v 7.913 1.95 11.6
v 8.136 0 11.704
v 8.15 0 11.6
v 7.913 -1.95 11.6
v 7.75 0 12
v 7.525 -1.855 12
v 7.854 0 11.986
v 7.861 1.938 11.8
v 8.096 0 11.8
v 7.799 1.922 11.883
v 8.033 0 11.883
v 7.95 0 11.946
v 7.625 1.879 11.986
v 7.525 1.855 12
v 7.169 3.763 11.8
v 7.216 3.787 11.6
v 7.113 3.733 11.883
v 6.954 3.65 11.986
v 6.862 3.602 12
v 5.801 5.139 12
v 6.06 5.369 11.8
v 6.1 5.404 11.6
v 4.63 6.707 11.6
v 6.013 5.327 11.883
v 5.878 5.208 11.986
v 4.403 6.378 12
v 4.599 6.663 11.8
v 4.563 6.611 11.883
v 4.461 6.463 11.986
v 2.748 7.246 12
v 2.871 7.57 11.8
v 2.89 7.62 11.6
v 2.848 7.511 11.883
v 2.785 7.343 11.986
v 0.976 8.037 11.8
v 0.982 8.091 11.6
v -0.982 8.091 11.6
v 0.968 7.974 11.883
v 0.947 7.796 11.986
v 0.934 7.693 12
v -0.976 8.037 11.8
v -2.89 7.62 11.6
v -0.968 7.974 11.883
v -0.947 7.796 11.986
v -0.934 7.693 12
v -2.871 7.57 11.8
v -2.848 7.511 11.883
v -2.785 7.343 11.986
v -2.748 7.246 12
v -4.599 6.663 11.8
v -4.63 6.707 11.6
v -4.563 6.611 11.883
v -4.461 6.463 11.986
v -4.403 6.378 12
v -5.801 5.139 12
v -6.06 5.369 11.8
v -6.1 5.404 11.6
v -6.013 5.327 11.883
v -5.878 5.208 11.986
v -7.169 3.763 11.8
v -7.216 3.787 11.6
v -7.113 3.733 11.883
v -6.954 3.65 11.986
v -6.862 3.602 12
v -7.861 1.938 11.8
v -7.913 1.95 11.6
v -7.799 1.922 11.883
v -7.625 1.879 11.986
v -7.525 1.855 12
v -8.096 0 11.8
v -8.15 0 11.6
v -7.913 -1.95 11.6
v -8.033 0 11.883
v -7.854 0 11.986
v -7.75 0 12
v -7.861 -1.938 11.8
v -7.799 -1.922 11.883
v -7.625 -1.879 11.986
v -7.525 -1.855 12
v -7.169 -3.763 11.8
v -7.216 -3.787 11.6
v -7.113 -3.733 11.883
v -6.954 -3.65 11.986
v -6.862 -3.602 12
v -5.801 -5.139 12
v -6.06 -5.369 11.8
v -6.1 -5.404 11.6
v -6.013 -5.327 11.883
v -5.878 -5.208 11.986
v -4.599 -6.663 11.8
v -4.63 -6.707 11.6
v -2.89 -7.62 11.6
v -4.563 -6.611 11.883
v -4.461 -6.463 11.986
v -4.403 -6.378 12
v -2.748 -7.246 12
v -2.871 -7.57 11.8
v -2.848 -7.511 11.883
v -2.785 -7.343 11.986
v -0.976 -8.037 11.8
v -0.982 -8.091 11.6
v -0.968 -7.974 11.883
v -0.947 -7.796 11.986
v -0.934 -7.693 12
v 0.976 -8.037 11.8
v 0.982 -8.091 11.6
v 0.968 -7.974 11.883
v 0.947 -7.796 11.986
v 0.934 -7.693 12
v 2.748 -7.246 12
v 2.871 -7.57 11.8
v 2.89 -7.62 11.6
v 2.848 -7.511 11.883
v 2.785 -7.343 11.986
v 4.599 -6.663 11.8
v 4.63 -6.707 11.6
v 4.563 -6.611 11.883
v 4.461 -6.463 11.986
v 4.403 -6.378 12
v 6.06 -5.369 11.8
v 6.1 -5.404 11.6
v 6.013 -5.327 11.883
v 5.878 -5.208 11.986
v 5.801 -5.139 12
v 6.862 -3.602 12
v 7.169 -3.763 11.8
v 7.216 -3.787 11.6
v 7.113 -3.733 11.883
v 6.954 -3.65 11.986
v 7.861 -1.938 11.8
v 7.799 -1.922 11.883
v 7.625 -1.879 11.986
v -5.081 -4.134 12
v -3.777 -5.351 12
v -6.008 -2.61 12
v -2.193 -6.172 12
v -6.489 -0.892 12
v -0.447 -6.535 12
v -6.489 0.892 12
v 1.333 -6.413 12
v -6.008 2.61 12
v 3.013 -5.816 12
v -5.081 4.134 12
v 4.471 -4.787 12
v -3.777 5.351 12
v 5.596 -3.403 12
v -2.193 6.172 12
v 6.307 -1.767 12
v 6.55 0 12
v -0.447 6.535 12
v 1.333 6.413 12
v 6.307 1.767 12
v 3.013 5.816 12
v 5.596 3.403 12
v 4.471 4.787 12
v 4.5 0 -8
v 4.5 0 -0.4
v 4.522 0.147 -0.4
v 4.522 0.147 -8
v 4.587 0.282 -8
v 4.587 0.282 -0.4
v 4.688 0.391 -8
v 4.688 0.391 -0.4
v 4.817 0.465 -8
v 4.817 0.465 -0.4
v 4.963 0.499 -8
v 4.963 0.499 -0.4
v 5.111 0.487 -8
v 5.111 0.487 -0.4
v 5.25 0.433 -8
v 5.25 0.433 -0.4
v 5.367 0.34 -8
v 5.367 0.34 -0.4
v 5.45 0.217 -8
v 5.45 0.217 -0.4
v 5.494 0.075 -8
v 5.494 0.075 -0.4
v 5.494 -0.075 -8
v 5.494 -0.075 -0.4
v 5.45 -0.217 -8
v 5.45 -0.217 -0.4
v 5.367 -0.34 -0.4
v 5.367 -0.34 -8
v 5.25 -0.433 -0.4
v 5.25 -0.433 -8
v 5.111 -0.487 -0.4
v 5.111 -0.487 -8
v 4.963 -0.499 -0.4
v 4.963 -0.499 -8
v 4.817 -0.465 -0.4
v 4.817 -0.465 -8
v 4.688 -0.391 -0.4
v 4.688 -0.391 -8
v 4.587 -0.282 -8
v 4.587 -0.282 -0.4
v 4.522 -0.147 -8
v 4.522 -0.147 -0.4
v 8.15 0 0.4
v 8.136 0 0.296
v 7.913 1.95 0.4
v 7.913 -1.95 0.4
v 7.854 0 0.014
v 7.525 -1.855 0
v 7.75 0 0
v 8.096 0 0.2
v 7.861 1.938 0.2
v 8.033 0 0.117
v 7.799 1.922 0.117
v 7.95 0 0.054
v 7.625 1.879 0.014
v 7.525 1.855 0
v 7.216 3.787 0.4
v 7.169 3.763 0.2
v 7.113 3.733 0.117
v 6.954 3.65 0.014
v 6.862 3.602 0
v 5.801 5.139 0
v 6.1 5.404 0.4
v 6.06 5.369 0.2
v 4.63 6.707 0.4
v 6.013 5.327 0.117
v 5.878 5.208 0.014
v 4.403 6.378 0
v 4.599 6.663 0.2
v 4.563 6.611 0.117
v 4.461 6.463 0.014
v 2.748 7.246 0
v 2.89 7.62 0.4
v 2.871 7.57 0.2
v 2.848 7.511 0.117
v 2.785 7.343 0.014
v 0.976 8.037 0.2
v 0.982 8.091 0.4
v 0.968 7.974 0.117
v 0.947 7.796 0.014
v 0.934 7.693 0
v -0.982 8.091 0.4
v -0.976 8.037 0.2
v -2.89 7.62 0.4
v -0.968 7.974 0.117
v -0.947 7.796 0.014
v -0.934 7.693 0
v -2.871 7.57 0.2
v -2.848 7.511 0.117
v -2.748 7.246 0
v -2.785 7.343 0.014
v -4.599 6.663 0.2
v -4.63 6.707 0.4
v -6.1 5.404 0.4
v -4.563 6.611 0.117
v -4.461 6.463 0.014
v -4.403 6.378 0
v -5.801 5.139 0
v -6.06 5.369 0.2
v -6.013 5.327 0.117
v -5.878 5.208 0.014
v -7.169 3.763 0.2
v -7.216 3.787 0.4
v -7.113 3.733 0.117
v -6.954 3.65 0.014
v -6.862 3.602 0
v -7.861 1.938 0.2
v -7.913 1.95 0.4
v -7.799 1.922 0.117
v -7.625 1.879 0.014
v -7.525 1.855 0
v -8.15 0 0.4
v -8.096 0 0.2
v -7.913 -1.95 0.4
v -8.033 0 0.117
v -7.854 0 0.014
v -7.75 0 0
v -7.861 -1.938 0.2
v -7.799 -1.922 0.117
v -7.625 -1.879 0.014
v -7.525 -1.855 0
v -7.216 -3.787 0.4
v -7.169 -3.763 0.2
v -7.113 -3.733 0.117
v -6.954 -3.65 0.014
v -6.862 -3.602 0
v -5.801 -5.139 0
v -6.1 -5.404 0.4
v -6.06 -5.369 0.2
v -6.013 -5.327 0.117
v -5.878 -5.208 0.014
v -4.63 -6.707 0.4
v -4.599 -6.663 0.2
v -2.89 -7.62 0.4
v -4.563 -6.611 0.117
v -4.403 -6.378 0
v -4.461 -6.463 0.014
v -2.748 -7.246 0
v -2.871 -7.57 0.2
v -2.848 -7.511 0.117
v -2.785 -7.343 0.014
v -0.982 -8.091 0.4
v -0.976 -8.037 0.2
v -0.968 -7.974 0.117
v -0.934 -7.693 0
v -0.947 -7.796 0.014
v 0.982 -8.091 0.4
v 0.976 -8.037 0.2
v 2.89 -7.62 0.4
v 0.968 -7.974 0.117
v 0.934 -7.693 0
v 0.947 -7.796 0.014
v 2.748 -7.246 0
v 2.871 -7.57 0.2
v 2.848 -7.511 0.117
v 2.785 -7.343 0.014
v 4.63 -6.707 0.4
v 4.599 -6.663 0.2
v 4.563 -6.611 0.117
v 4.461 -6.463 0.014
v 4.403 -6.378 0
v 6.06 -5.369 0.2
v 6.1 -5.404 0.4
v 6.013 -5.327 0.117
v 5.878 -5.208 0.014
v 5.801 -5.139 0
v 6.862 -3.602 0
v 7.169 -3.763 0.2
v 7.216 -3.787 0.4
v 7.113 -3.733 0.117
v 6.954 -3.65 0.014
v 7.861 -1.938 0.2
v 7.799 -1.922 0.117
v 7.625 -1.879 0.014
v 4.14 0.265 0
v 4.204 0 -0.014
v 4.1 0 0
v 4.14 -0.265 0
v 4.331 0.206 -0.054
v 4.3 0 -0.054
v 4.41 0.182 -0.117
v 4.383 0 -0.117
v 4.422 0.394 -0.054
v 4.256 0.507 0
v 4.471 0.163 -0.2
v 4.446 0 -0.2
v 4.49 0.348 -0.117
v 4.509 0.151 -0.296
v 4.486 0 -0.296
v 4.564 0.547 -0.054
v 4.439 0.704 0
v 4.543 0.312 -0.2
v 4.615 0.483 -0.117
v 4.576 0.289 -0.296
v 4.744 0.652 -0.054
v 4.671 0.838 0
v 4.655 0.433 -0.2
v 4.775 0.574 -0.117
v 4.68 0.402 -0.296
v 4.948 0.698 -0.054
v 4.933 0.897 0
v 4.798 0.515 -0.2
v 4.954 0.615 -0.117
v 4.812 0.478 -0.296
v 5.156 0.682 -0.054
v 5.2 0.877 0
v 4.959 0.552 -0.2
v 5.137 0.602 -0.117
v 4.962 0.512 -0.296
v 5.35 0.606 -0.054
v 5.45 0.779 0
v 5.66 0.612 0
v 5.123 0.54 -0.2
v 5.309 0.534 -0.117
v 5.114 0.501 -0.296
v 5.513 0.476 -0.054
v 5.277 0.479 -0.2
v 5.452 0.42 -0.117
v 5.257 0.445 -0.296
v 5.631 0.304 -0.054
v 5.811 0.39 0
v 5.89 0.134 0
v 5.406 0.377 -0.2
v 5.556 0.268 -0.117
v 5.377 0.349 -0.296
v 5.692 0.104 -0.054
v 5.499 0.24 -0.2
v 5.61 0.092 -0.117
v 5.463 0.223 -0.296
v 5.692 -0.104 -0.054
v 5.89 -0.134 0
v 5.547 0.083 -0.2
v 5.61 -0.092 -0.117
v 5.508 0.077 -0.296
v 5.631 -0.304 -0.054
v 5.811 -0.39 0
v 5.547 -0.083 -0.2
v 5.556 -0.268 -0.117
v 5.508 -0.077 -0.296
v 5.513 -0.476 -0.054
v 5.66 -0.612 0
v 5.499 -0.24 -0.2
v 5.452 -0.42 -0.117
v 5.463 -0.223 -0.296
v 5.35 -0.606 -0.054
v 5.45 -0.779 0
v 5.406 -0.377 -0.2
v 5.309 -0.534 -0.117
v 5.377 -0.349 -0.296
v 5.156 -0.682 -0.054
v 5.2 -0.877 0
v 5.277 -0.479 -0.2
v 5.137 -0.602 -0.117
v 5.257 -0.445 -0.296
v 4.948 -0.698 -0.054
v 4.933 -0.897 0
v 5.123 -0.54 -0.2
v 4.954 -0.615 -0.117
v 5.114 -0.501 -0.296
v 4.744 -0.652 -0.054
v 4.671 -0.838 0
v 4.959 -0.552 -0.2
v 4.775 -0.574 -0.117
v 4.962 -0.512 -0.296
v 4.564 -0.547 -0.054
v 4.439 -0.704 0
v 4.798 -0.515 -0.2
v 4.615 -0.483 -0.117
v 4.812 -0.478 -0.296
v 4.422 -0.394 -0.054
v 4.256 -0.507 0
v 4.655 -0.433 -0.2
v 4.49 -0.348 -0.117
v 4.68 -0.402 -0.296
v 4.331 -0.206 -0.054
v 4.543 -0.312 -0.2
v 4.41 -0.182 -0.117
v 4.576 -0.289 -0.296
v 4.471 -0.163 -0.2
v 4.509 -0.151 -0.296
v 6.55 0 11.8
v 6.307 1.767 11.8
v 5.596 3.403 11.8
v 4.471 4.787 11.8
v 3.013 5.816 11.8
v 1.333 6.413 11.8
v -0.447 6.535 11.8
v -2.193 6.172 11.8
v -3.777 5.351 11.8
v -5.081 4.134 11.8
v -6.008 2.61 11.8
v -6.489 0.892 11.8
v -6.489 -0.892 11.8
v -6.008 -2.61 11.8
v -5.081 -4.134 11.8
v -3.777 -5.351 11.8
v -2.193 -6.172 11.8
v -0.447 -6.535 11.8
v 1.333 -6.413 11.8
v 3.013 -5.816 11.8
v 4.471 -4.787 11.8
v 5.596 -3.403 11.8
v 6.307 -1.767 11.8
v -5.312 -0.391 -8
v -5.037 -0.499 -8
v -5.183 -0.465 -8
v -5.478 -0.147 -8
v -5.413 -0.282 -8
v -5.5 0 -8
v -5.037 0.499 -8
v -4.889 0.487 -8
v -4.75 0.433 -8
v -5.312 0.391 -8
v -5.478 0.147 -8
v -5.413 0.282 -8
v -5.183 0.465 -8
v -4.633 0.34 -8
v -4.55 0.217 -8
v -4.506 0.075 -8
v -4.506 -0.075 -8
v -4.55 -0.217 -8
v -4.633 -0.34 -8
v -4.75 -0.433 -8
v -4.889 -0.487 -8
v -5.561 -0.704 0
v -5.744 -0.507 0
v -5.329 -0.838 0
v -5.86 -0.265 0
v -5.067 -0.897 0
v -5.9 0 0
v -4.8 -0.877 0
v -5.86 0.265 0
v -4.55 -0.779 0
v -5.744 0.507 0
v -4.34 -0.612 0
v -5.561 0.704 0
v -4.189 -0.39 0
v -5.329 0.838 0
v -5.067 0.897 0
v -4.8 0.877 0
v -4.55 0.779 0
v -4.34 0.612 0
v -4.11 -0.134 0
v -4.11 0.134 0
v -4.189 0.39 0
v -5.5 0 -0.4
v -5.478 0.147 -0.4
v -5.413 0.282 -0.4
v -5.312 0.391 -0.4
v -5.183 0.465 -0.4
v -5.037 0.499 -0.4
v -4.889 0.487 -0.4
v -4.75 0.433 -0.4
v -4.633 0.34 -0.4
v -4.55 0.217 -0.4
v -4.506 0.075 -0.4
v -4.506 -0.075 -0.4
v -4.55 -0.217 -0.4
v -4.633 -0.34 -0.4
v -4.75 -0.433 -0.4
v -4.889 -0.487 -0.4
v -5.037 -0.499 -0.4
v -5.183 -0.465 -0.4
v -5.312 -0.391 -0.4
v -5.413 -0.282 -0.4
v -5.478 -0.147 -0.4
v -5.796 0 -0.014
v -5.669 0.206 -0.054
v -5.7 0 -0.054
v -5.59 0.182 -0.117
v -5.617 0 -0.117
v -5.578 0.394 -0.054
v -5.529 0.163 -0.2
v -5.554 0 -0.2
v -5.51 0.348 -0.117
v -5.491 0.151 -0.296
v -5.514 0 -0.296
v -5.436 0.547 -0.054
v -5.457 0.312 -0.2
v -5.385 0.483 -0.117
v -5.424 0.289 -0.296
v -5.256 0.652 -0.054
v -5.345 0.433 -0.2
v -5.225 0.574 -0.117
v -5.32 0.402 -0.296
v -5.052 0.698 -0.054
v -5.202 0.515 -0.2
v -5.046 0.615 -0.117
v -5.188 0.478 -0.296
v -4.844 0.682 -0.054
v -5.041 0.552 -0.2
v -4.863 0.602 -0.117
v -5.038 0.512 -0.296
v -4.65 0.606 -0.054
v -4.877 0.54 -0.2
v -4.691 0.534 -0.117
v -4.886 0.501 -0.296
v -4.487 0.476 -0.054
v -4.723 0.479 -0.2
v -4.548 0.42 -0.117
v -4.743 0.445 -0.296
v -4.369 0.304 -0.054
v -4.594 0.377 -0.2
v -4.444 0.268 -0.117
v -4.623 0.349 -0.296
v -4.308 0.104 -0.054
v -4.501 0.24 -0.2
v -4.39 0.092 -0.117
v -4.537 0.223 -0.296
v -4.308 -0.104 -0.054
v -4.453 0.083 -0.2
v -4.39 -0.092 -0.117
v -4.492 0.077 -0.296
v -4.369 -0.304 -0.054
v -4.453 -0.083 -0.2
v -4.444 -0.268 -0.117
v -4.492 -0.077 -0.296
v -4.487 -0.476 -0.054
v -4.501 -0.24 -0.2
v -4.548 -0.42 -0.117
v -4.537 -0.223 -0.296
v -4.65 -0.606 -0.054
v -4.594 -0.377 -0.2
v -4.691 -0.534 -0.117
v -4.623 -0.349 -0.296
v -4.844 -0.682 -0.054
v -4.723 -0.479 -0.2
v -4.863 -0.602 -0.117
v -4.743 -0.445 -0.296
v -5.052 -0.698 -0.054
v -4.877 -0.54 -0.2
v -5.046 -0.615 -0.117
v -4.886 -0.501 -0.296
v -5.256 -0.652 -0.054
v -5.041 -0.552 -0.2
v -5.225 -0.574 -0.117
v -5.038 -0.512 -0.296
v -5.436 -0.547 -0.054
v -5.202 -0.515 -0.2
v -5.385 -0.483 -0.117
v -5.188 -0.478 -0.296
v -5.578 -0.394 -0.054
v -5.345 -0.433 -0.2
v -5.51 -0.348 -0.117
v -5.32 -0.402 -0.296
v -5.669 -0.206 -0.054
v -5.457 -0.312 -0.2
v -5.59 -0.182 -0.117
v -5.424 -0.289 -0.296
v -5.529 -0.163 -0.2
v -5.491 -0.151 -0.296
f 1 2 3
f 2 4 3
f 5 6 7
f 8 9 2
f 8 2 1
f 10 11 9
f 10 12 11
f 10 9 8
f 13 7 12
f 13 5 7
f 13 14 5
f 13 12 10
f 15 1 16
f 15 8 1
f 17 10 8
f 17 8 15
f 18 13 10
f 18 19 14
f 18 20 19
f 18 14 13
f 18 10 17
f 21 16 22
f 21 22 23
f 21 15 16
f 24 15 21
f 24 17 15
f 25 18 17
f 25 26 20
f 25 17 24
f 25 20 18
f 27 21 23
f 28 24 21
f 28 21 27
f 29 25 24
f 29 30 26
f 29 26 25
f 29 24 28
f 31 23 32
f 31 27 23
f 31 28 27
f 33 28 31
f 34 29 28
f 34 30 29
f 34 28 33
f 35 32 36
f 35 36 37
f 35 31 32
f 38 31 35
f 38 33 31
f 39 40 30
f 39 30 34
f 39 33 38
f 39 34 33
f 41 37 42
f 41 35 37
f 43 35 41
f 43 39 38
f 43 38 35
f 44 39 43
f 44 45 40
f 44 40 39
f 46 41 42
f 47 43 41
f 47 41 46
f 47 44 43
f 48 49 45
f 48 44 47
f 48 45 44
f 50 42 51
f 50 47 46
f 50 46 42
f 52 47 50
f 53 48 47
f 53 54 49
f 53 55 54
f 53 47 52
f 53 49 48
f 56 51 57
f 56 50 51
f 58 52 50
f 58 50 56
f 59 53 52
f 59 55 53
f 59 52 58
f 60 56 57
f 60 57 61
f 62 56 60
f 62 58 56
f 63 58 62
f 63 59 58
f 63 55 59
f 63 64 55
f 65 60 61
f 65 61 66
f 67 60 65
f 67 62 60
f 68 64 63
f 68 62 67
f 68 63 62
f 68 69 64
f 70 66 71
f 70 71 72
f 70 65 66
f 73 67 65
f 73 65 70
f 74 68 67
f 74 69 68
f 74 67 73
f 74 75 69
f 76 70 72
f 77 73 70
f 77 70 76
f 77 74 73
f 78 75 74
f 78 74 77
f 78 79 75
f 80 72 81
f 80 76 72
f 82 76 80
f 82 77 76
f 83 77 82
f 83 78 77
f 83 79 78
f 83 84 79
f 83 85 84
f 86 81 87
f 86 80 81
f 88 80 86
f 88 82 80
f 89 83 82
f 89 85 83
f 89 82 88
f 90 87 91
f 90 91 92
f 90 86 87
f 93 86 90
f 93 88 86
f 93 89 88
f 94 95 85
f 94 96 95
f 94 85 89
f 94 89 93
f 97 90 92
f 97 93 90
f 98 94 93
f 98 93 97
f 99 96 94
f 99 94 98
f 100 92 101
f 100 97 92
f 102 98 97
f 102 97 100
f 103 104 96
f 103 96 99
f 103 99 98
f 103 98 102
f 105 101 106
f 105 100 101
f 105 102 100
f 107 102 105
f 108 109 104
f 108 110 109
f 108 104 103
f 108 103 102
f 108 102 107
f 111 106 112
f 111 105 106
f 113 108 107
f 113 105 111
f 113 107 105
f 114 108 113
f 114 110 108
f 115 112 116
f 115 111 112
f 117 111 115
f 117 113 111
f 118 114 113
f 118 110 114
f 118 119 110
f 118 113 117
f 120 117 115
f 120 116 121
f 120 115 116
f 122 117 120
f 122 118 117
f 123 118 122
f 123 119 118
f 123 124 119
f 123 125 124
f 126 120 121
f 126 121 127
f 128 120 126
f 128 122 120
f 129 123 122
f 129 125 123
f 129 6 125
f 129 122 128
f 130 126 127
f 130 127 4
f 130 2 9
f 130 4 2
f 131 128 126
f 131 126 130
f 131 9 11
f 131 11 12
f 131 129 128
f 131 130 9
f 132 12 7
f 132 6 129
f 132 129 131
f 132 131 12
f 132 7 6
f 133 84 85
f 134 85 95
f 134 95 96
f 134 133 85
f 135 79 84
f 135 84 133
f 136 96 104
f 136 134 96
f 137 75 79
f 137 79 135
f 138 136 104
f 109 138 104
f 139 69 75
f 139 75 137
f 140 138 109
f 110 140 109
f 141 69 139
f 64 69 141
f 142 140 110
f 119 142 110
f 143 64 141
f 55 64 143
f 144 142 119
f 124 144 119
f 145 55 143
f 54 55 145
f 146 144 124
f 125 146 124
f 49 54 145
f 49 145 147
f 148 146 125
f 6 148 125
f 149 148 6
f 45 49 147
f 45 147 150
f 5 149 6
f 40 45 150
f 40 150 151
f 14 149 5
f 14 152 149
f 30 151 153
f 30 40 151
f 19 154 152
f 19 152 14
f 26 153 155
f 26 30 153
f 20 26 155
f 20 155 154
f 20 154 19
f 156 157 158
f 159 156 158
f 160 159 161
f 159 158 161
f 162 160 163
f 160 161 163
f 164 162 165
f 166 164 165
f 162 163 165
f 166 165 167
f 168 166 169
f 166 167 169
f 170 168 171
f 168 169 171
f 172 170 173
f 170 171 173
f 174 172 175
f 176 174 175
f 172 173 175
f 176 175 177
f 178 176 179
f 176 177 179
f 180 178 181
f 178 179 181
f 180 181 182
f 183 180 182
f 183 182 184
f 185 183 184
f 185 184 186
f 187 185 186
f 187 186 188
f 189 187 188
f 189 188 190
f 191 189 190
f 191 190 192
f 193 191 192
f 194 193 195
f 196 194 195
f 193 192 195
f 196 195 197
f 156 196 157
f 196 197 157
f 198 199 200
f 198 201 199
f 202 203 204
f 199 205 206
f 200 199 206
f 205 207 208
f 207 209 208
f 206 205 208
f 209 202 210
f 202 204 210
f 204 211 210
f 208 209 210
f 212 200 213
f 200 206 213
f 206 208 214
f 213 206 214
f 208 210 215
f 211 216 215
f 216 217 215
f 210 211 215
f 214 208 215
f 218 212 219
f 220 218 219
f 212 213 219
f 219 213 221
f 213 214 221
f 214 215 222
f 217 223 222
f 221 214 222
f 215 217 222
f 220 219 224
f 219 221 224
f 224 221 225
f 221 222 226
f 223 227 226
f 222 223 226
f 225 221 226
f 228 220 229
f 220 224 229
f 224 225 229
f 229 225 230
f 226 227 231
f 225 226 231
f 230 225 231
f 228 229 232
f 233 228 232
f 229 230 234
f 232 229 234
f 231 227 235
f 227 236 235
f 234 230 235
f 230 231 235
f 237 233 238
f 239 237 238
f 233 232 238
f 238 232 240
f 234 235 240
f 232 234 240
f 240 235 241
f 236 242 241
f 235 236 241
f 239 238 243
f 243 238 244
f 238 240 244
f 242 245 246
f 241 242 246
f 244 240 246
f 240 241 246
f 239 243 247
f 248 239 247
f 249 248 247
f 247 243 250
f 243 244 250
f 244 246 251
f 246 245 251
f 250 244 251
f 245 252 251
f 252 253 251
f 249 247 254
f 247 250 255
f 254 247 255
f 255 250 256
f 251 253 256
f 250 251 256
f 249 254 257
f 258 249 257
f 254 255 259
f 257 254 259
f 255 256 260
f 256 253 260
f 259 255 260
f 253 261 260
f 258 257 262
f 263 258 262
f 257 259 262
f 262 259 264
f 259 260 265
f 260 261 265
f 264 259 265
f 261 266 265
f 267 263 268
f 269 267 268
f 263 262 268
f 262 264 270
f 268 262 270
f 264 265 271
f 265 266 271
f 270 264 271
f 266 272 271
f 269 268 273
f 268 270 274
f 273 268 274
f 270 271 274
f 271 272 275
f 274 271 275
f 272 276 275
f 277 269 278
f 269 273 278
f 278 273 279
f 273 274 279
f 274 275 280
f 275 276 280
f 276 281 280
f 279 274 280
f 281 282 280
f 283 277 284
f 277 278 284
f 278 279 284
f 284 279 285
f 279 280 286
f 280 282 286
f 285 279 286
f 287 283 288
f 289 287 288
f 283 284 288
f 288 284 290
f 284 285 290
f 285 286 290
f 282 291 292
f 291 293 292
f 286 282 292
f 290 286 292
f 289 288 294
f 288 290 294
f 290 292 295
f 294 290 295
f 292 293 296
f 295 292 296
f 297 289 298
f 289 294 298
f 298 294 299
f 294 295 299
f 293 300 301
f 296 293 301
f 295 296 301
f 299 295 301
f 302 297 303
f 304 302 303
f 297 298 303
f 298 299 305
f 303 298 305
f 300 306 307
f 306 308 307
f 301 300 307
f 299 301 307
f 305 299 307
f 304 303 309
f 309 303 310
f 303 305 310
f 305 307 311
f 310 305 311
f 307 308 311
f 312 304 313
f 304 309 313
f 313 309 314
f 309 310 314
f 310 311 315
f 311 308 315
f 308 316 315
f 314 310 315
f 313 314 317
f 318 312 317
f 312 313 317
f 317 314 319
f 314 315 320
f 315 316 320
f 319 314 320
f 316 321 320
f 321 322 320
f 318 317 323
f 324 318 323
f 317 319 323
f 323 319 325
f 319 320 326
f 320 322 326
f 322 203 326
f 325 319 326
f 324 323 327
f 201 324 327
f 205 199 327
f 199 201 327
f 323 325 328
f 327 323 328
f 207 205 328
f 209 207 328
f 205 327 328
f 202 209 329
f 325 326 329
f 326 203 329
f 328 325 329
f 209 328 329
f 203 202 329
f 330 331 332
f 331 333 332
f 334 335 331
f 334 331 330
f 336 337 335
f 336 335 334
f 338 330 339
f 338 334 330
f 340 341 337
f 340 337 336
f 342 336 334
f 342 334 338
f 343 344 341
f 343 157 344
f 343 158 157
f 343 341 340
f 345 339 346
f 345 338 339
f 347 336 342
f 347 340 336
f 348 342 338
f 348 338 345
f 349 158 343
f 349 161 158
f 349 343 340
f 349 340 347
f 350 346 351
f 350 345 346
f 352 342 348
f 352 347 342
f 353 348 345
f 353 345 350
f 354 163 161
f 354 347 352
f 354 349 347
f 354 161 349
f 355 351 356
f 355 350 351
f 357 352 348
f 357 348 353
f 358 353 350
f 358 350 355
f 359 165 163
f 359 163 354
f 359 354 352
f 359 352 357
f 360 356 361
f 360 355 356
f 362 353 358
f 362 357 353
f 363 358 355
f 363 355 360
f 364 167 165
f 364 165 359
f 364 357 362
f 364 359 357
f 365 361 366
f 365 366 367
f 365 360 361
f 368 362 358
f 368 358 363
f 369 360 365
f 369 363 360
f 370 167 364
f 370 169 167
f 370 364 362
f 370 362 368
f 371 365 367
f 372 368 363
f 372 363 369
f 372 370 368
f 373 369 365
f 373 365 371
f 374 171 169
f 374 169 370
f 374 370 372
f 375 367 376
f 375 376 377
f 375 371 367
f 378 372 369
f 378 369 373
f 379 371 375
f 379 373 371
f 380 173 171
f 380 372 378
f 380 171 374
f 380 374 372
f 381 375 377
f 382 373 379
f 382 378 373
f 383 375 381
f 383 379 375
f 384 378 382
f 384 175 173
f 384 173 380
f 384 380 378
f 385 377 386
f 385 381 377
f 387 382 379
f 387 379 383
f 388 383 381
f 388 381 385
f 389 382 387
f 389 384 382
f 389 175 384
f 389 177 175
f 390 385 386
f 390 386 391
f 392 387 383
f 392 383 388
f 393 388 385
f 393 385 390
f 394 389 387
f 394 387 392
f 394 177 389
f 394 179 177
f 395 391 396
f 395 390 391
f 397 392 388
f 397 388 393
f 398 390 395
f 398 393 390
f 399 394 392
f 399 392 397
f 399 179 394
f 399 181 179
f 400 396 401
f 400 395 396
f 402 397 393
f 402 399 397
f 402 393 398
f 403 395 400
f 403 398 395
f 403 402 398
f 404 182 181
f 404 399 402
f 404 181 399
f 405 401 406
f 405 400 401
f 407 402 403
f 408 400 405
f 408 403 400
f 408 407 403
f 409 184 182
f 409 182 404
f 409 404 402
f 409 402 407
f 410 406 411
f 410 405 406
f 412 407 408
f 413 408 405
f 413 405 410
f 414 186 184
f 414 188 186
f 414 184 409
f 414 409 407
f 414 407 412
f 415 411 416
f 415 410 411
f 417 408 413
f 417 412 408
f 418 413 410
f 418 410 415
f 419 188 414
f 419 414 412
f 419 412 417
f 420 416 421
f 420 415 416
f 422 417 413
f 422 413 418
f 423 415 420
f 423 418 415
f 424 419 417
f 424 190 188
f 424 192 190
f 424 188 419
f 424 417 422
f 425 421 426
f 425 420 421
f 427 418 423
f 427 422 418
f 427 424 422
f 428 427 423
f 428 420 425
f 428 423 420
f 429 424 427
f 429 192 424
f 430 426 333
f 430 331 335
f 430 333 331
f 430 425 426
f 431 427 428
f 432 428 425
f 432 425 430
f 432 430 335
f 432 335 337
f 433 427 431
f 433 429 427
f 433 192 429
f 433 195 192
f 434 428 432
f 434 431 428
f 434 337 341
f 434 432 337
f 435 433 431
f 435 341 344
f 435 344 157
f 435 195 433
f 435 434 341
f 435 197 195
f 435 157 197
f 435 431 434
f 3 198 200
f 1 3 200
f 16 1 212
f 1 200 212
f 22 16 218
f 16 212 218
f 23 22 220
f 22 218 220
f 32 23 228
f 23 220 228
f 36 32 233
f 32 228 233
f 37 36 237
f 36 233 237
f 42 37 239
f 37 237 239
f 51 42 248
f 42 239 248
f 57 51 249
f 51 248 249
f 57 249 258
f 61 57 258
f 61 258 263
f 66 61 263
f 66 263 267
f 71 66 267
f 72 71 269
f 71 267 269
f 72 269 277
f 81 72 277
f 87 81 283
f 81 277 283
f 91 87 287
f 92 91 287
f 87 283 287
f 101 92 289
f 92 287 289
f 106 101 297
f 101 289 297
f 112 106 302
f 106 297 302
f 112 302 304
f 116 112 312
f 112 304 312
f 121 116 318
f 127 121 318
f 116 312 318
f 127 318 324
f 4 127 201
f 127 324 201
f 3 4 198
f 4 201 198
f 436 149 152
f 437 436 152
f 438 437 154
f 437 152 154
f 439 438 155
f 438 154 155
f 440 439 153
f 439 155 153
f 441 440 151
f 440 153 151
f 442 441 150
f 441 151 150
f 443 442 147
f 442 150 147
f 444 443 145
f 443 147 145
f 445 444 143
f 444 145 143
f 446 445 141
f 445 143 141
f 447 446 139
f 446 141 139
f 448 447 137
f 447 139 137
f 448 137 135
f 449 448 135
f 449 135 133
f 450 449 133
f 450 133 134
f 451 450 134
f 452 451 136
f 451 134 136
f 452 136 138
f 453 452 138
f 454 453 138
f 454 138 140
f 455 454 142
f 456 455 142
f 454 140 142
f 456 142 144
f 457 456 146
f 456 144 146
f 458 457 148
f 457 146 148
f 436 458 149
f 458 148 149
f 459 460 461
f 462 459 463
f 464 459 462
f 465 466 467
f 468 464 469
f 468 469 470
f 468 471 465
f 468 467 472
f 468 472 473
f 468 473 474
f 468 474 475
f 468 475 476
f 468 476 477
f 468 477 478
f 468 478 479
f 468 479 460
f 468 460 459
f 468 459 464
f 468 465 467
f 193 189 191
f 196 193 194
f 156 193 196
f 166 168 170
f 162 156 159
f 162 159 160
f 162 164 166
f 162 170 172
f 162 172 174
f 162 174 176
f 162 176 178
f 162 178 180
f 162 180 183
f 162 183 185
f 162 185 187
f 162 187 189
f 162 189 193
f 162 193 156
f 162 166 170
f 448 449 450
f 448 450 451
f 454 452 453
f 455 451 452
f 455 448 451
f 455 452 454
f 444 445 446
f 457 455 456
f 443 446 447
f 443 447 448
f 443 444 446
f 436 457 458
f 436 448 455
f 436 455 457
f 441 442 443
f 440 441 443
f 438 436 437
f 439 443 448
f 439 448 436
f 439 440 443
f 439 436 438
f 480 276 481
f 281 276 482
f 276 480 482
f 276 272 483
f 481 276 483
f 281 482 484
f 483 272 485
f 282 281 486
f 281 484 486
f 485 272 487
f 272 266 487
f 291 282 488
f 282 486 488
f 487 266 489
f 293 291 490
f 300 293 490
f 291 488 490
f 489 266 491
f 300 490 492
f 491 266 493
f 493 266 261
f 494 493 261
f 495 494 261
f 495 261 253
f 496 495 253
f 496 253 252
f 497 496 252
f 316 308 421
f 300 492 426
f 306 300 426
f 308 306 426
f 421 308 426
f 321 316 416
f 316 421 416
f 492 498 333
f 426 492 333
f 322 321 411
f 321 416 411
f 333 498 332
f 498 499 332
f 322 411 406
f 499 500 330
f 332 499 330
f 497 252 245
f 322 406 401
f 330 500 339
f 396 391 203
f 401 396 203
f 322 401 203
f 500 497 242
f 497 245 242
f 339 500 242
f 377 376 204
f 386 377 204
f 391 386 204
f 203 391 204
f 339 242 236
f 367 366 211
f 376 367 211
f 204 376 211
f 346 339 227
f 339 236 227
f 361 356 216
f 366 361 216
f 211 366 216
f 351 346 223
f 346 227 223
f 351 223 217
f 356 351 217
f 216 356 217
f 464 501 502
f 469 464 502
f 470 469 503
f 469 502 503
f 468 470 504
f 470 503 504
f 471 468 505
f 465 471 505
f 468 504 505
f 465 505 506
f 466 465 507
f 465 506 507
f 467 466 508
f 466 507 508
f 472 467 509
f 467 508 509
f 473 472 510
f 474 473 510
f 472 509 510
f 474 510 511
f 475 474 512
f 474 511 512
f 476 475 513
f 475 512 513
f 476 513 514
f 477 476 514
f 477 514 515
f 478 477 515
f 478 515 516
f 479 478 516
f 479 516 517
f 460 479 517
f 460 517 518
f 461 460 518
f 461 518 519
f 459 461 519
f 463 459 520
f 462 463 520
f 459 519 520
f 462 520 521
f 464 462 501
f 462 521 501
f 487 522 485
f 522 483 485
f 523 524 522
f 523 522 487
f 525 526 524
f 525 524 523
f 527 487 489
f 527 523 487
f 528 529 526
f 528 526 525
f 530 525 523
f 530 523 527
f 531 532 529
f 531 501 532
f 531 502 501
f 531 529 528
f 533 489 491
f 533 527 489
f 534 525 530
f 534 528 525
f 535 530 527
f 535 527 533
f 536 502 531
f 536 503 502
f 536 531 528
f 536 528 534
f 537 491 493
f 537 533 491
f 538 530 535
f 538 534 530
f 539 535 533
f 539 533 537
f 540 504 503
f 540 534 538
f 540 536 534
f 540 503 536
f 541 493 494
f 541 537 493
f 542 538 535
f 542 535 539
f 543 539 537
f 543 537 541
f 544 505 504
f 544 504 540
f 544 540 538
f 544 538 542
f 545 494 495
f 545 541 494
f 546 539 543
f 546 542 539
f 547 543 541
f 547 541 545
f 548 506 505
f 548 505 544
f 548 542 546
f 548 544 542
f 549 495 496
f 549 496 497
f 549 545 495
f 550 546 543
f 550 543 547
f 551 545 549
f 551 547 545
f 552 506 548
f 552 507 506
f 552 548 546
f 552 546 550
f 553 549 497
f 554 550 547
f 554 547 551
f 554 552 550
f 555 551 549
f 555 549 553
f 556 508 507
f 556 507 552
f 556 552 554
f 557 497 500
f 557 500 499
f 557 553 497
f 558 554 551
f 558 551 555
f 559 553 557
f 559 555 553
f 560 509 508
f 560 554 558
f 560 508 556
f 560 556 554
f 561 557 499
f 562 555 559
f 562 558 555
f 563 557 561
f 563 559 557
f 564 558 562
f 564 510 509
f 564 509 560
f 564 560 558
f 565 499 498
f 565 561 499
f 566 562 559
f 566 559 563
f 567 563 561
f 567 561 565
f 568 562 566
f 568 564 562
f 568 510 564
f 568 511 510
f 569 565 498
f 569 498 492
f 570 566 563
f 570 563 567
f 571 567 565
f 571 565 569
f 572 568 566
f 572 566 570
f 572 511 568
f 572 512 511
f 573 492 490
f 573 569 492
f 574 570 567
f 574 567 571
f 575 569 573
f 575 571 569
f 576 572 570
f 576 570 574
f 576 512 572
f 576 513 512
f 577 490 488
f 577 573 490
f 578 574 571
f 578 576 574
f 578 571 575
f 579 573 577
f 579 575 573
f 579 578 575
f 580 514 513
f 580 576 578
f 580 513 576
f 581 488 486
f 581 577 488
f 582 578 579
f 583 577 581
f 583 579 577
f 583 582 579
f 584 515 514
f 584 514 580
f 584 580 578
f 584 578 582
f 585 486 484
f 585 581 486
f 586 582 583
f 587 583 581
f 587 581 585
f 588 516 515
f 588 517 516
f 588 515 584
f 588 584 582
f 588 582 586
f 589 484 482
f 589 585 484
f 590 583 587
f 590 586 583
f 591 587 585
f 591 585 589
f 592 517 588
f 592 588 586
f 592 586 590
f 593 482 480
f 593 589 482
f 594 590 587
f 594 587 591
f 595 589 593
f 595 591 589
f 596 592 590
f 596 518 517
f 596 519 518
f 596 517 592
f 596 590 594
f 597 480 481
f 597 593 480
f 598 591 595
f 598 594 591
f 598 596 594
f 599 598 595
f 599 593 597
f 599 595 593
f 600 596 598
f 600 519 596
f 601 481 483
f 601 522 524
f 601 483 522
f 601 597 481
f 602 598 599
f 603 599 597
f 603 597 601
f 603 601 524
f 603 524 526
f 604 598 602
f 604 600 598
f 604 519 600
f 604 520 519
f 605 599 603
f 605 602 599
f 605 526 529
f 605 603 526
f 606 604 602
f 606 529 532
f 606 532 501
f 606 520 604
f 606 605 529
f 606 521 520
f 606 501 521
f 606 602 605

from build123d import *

# Parameters (mm, degrees)
ESQCORPS_R   = 8.15
CORPS_DEPTH  = 12
ESQPATTES_R  = 0.5
PATTES_DEPTH = 8
CONG_1_R     = 0.4
ESQDEVANT_R  = 6.55
DEVANT_DEPTH = 0.2


with BuildPart() as part:
    # EsqCorps → Corps (new body)
    with BuildSketch(Plane.XY):
        Circle(ESQCORPS_R)
    extrude(amount=CORPS_DEPTH)

    # EsqPattes → Pattes (add)
    with BuildSketch(Plane(origin=(0, 0, 0), x_dir=(-1, 0, 0), z_dir=(0, 0, -1))):
        with Locations((-5, 0)):
            Circle(ESQPATTES_R)
        with Locations((5, 0)):
            Circle(ESQPATTES_R)
    extrude(amount=PATTES_DEPTH)

    # Congé1
    cong_1_edges = [part.edges().sort_by_distance(p)[0] for p in [
        (-8.15, 0, 0),
        (-8.15, 0, 12),
        (5.5, 0, 0),
        (-4.5, 0, 0),
    ]]
    fillet(cong_1_edges, radius=CONG_1_R)

    # EsqDevant → Devant (cut)
    with BuildSketch(Plane.XY.offset(12)):
        Circle(ESQDEVANT_R)
    extrude(amount=-DEVANT_DEPTH, mode=Mode.SUBTRACT)


solid = part.part
